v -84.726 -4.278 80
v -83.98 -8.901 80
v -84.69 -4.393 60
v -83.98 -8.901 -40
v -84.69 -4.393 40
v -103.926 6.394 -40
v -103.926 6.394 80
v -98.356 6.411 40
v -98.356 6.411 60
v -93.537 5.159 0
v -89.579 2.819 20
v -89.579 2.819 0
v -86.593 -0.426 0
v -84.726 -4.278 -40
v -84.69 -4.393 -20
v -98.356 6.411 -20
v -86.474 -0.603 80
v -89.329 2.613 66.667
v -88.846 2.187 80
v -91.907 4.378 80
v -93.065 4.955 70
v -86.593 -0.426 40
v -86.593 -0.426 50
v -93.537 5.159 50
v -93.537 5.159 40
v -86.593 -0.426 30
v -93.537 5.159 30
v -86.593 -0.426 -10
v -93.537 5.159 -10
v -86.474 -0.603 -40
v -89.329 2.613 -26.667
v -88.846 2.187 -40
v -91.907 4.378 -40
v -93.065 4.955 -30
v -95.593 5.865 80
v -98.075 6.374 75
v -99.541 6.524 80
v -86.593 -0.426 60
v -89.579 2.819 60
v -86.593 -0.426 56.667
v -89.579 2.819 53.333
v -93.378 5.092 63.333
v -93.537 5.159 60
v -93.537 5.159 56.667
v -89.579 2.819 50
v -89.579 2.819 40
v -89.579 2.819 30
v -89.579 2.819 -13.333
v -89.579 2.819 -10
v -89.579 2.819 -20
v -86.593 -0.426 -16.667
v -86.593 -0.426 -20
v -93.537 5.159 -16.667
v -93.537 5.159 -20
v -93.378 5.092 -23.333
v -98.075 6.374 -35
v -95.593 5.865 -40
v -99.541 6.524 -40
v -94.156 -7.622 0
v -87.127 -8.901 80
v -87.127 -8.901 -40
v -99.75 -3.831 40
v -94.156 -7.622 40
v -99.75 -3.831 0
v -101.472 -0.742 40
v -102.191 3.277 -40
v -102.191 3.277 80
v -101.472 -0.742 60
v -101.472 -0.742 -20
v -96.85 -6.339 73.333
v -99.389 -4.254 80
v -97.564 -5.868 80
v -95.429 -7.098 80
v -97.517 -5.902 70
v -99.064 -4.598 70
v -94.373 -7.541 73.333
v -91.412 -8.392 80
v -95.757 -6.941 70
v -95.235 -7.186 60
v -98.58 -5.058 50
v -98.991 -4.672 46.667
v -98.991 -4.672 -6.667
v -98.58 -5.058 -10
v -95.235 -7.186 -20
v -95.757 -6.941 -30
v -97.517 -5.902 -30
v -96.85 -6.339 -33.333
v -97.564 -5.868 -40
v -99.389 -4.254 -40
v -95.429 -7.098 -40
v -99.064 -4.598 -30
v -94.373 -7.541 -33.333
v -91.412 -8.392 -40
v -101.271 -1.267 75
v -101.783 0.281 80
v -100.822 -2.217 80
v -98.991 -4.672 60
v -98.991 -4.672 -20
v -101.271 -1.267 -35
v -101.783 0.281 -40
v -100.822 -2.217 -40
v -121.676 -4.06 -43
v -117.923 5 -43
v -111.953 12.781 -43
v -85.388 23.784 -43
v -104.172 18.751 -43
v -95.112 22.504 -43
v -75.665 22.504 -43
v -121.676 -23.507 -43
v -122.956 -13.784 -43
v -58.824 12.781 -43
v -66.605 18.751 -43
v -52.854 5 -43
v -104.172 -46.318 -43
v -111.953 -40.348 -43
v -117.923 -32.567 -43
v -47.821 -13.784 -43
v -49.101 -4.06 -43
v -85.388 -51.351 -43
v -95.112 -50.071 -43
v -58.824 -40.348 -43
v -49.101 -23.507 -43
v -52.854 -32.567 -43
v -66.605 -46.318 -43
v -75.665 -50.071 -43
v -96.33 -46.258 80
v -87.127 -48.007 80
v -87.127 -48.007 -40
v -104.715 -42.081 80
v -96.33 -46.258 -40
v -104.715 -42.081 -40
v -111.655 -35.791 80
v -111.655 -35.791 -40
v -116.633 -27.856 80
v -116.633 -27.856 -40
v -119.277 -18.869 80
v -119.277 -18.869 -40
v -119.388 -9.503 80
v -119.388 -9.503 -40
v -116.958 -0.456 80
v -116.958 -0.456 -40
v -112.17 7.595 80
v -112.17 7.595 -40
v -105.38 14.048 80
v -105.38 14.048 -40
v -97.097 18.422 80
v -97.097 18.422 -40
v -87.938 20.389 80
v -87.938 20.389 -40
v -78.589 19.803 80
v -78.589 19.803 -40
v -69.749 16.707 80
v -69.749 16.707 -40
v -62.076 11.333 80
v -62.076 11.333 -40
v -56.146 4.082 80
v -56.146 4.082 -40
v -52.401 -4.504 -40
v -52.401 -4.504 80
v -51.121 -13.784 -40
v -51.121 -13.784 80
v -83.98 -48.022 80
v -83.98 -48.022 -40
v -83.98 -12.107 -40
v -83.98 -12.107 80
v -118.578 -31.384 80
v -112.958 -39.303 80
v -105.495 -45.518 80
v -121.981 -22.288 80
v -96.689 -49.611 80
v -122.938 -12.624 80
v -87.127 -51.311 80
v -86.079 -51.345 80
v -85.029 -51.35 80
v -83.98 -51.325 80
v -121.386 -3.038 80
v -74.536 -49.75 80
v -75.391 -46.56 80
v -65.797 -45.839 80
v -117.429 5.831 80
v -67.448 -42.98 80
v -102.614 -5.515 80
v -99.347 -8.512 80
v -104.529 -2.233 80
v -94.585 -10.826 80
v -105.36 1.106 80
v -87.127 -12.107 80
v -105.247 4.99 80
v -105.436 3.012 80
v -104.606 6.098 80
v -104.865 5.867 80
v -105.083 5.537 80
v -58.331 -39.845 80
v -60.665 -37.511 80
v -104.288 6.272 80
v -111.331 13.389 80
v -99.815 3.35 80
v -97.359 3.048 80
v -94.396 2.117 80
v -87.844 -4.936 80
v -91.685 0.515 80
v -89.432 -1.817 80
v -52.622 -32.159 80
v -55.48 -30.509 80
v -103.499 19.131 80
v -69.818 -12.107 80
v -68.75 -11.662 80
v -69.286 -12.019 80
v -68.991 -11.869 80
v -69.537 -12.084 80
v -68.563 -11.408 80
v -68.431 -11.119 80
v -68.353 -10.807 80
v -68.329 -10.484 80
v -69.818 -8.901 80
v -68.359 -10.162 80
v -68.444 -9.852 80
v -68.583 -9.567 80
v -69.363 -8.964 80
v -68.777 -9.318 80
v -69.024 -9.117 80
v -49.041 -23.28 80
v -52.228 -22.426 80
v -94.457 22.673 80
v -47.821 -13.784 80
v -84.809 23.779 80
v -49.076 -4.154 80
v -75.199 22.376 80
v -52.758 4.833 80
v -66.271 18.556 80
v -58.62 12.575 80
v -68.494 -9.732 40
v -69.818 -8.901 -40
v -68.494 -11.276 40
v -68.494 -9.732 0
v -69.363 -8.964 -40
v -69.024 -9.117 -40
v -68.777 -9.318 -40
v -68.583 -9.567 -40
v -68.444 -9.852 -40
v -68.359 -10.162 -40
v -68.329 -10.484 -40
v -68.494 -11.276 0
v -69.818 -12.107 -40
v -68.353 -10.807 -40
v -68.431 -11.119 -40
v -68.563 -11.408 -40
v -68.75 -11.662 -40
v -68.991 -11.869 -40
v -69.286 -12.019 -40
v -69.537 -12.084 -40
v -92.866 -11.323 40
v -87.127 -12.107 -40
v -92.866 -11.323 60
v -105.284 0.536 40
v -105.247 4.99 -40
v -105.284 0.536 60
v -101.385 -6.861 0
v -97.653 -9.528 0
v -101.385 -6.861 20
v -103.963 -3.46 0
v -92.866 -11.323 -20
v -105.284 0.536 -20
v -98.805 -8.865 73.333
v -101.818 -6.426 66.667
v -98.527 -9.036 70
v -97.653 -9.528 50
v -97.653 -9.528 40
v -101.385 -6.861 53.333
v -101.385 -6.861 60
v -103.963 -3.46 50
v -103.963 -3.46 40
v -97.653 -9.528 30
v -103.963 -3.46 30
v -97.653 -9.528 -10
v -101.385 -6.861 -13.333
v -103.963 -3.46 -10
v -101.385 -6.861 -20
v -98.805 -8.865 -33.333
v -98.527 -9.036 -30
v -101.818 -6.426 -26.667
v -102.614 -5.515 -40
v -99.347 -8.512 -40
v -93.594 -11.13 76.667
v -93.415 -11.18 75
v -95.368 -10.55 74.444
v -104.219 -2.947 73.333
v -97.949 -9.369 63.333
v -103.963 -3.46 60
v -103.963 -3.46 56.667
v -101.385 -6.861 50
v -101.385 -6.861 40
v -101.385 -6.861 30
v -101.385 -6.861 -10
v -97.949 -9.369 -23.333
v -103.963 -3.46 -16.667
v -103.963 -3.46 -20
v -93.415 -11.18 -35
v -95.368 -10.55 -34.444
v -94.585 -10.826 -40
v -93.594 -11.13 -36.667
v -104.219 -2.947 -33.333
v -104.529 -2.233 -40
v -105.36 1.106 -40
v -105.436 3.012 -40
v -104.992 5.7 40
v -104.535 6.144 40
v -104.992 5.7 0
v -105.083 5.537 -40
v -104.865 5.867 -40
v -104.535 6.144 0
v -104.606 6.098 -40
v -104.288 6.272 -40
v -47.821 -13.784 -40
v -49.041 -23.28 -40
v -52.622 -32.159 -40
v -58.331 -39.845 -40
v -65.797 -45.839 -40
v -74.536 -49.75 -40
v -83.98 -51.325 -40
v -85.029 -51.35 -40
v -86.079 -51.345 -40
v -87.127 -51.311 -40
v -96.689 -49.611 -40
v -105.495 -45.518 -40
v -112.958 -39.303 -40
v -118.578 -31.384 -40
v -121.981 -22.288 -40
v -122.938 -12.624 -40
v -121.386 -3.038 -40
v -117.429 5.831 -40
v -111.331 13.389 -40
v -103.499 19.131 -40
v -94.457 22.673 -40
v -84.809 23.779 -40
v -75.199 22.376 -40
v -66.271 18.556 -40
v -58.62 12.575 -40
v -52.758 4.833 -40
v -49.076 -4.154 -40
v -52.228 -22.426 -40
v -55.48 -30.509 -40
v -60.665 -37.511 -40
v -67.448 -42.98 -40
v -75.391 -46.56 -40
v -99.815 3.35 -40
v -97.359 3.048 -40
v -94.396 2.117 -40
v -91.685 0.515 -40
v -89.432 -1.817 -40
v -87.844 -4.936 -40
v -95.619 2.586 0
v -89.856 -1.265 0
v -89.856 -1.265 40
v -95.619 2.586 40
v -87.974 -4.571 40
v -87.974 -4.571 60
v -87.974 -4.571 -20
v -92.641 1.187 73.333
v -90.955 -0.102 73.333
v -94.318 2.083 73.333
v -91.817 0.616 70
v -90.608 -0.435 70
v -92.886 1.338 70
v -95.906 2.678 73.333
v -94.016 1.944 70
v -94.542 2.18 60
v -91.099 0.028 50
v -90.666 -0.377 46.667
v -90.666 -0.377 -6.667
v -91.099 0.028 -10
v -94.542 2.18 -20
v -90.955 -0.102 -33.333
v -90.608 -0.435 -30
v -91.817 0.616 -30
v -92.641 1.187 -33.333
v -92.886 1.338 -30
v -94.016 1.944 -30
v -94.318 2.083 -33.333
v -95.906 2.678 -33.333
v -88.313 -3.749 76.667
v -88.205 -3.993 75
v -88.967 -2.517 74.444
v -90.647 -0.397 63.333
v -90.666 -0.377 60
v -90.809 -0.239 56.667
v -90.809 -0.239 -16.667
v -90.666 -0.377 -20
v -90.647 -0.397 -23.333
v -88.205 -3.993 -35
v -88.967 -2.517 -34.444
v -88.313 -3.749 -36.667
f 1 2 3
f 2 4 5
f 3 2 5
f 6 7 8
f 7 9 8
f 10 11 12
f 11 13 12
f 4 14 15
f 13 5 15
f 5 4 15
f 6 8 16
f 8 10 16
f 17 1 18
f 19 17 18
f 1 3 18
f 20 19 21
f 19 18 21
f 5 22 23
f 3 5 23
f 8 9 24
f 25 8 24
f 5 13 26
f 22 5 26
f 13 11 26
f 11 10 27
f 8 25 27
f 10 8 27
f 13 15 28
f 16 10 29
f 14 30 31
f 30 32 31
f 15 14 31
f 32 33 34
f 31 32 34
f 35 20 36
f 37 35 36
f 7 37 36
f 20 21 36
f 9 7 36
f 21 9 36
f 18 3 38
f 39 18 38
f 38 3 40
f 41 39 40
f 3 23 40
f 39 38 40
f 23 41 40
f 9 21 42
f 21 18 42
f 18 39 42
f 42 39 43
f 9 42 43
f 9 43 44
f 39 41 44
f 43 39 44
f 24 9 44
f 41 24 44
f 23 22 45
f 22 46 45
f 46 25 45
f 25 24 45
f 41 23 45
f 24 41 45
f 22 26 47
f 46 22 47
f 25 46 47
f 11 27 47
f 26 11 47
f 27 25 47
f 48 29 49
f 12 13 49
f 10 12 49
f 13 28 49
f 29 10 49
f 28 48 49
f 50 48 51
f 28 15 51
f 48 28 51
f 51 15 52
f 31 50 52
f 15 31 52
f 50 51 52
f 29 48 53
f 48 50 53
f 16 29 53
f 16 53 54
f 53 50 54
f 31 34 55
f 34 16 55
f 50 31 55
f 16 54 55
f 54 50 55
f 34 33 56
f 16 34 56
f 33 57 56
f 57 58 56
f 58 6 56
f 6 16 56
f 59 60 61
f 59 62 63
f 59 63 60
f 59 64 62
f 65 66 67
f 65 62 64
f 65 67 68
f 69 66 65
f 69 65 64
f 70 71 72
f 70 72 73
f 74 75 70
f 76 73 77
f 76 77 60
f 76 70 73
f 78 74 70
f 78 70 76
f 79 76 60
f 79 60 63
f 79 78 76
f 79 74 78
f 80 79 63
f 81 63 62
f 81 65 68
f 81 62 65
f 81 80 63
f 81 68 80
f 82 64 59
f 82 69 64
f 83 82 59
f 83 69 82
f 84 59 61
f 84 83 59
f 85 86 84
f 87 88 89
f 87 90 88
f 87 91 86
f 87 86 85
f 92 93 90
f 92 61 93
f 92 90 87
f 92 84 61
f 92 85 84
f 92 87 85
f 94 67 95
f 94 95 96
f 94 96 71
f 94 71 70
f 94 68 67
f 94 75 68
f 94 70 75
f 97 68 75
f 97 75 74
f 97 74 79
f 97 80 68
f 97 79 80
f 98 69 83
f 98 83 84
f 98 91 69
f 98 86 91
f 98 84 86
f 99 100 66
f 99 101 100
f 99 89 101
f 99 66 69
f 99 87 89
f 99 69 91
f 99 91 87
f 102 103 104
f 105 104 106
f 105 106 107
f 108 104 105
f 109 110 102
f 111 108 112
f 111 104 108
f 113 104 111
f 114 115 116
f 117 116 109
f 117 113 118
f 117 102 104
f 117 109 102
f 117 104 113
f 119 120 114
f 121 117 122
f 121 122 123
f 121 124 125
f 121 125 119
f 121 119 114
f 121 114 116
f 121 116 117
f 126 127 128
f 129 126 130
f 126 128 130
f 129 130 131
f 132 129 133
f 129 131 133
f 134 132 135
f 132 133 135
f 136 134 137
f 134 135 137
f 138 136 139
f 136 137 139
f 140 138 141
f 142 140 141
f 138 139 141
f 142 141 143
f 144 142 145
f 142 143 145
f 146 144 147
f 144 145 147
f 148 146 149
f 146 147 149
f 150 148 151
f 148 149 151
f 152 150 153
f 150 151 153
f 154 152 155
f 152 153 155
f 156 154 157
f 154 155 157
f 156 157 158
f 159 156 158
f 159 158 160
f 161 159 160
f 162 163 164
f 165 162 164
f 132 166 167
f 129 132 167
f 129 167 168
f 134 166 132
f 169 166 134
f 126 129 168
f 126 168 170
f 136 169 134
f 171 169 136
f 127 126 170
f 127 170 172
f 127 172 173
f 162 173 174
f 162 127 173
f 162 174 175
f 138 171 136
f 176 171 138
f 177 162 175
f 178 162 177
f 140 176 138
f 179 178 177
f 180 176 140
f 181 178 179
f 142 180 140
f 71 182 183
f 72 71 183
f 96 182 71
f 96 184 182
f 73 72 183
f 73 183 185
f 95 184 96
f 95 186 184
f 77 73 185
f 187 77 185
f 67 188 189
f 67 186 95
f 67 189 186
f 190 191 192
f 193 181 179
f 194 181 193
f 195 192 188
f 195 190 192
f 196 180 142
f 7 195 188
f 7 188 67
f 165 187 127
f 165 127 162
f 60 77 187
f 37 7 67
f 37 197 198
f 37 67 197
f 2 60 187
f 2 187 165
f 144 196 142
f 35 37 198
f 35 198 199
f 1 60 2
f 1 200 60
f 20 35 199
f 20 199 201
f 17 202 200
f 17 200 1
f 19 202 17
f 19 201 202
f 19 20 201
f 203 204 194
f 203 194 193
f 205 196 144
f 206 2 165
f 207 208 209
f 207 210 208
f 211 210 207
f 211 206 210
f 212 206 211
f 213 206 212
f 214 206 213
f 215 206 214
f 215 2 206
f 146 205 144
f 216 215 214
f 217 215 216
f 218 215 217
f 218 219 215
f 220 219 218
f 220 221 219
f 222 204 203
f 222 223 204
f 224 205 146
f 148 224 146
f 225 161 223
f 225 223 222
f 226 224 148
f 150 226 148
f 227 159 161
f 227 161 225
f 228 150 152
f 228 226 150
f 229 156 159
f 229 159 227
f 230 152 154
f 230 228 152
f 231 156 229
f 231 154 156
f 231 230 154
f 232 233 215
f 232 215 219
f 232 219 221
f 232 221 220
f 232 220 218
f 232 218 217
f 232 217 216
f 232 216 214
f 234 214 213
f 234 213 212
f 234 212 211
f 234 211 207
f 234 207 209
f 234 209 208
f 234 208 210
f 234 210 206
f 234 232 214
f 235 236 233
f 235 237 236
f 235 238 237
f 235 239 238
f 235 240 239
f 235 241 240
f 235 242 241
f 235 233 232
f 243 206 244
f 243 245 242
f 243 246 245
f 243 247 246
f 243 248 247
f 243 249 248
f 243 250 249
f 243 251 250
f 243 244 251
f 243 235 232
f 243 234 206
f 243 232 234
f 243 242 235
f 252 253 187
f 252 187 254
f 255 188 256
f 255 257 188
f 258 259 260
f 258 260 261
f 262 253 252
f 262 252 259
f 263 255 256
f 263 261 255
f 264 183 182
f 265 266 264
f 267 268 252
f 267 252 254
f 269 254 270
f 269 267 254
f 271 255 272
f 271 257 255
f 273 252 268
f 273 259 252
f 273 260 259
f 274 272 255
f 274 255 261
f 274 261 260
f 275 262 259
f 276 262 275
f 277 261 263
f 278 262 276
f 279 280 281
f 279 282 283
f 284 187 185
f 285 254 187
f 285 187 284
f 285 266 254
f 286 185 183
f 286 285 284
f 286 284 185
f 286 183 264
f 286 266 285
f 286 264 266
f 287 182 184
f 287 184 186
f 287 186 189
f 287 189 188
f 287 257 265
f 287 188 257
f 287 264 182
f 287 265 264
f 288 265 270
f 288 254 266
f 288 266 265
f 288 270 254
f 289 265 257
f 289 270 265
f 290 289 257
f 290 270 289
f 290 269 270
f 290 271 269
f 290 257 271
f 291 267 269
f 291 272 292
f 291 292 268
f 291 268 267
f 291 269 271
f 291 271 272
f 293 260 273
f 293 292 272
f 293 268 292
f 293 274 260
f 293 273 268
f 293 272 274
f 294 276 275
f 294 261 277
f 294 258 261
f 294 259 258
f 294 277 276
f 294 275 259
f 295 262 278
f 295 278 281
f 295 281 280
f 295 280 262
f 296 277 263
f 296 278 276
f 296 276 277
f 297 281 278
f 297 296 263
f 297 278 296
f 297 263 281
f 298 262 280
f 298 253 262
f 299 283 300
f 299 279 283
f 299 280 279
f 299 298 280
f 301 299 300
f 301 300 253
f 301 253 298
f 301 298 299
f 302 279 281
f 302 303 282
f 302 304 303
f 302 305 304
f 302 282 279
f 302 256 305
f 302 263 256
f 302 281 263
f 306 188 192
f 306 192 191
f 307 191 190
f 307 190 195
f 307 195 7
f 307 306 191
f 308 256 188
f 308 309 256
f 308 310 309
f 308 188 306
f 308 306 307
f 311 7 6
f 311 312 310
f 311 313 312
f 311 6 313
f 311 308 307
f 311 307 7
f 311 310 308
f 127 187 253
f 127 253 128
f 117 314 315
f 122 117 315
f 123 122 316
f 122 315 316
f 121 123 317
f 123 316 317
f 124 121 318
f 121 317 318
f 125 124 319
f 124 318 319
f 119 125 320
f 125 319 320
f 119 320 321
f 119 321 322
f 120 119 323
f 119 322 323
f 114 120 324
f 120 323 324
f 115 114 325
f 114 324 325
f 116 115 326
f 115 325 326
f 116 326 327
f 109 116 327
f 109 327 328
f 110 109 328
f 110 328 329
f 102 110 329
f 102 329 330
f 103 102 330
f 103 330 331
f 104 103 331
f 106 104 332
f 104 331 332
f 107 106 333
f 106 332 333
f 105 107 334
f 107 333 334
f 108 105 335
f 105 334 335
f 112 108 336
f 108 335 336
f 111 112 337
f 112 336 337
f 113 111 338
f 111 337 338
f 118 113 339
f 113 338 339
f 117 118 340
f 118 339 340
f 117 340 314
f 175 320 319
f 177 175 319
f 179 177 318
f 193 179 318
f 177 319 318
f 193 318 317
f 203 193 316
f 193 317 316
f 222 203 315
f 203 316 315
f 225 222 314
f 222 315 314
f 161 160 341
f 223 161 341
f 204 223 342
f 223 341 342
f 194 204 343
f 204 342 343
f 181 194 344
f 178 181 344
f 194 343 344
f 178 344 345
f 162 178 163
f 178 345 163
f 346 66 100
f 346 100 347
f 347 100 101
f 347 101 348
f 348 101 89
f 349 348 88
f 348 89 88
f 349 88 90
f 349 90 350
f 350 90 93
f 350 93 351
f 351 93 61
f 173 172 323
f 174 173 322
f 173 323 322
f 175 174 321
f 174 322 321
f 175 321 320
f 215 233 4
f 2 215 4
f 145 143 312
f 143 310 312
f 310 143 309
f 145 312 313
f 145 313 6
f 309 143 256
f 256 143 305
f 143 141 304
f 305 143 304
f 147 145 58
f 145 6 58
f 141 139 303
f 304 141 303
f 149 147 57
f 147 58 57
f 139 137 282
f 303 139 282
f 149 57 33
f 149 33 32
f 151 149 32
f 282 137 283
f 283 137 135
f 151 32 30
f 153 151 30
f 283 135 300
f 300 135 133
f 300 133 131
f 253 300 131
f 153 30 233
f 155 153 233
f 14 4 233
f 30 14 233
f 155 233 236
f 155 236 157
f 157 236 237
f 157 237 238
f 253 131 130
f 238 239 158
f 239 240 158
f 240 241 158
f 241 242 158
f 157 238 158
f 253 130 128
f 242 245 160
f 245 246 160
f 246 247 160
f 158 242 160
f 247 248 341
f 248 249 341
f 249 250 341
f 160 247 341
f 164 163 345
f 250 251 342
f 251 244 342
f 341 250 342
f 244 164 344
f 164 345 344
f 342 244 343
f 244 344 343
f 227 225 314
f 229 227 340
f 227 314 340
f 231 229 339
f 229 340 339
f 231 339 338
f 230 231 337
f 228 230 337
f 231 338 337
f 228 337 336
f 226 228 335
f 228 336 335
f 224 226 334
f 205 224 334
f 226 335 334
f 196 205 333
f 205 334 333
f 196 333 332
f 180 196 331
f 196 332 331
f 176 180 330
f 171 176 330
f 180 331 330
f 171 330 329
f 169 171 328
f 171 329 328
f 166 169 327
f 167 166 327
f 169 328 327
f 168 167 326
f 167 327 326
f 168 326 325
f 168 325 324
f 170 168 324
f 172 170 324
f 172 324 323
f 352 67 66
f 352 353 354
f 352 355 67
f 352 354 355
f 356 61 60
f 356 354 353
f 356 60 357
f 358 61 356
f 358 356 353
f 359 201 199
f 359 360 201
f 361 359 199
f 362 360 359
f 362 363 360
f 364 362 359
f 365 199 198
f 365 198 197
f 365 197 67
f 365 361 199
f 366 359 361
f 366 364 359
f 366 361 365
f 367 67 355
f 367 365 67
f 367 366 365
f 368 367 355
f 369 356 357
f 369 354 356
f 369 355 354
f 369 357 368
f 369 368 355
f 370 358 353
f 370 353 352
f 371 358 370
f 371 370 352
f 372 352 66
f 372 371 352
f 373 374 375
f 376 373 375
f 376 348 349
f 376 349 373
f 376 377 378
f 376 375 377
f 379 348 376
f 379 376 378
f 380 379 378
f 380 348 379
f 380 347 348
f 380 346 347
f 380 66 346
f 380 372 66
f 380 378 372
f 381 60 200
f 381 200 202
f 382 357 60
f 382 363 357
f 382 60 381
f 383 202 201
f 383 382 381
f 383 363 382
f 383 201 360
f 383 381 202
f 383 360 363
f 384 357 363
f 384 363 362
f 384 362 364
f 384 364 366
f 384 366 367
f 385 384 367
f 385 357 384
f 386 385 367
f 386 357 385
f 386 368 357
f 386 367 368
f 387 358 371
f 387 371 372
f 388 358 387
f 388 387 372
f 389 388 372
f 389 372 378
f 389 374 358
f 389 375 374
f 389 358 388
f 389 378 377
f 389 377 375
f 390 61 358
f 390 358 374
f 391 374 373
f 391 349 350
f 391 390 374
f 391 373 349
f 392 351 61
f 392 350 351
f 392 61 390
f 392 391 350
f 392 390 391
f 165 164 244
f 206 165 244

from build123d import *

# Parameters (mm, degrees)
F1_DEPTH = 80
F2_R     = 25.0450733491
F3_DEPTH = 2
F4_SCALE = 1.5


with BuildPart() as f1:
    # F0 (on Top) → F1 (new body)
    with BuildSketch(Plane.XY):
        with BuildLine():
            ThreePointArc((-83.9803607371, -38.2521874792), (-66.8806784634, -30.5992095312), (-59.8739669949, -13.2247109851))
            ThreePointArc((-59.8739669949, -13.2247109851), (-102.2138217774, 4.8900960587), (-86.0784208338, -38.2429350617))
            Line((-86.0784208338, -38.2429350617), (-86.0784208338, -36.0403462646))
            ThreePointArc((-86.0784208338, -36.0403462646), (-100.6577068059, 3.3340255104), (-62.0739669949, -13.2247109851))
            ThreePointArc((-62.0739669949, -13.2247109851), (-68.4366014954, -29.0432629394), (-83.9803607371, -36.0504915177))
            Line((-83.9803607371, -36.0504915177), (-83.9803607371, -38.2521874792))
        make_face()
        with BuildLine():
            Line((-86.0784208338, -36.0403462646), (-86.0784208338, -38.2429350617))
            ThreePointArc((-86.0784208338, -38.2429350617), (-85.0294877149, -38.2695407997), (-83.9803607371, -38.2521874792))
            Line((-83.9803607371, -38.2521874792), (-83.9803607371, -36.0504915177))
            ThreePointArc((-83.9803607371, -36.0504915177), (-85.029507314, -36.0695172521), (-86.0784208338, -36.0403462646))
        make_face()
        with BuildLine():
            Line((-86.0784208338, -12.1068419315), (-86.0784208338, -36.0403462646))
            ThreePointArc((-86.0784208338, -36.0403462646), (-85.029507314, -36.0695172521), (-83.9803607371, -36.0504915177))
            Line((-83.9803607371, -36.0504915177), (-83.9803607371, -12.1068419315))
            Line((-83.9803607371, -12.1068419315), (-74.5387463539, -12.1068419315))
            add(Edge.make_bspline(
                [(-74.5387463539, -9.9696172834), (-73.2151210172, -9.9696172834), (-73.2151210172, -12.1068419315), (-74.5387463539, -12.1068419315)],
                knots=[0, 0, 0, 0, 2.1372246482, 2.1372246482, 2.1372246482, 2.1372246482], degree=3))
            Line((-74.5387463539, -9.9696172834), (-83.9803607371, -9.9696172834))
            add(Edge.make_bspline(
                [(-83.9803607371, -9.9696172834), (-84.0809768118, -3.6797905773), (-89.3996719456, 1.1776616923), (-97.2777081452, 0.2270288754)],
                knots=[0, 0, 0, 0, 16.75682073, 16.75682073, 16.75682073, 16.75682073], degree=3))
            add(Edge.make_bspline(
                [(-98.1584286764, -0.7088489999), (-98.0651277816, -0.131296323), (-97.7239810489, 0.1096969641), (-97.2777081452, 0.2270288754)],
                knots=[0, 0, 0, 0, 1.285121026, 1.285121026, 1.285121026, 1.285121026], degree=3))
            add(Edge.make_bspline(
                [(-86.0784208338, -12.1068419315), (-94.3202596093, -11.7972125657), (-99.1570433309, -6.8904892511), (-98.1584286764, -0.7088489999)],
                knots=[0, 0, 0, 0, 16.6084566517, 16.6084566517, 16.6084566517, 16.6084566517], degree=3))
        make_face()
        with BuildLine():
            add(Edge.make_bspline(
                [(-86.0784208338, -9.9696172834), (-86.3917425183, -3.4782894727), (-91.9644045086, -1.3975845126), (-96.120710429, -1.8510752765)],
                knots=[0, 0, 0, 0, 12.9134931227, 12.9134931227, 12.9134931227, 12.9134931227], degree=3))
            add(Edge.make_bspline(
                [(-96.120710429, -1.8510752765), (-95.9267848545, -7.8749013541), (-90.8607281187, -9.7746726897), (-86.0784208338, -9.9696172834)],
                knots=[0, 0, 0, 0, 12.9134931227, 12.9134931227, 12.9134931227, 12.9134931227], degree=3))
        make_face(mode=Mode.SUBTRACT)
    extrude(amount=F1_DEPTH)

    # F2 (on face) → F3 (join)
    with BuildSketch(Plane(origin=(0, 0, 0), x_dir=(1, 0, 0), z_dir=(0, 0, -1))):
        with Locations((-84.919040344, 13.2247109851)):
            Circle(F2_R)
    extrude(amount=F3_DEPTH)


with BuildPart() as f1_1:
    # F4: moved
    add(f1.part.scale(F4_SCALE).moved(Location((41.9901803686, 6.0534209658, -40))))


solid = f1_1.part
